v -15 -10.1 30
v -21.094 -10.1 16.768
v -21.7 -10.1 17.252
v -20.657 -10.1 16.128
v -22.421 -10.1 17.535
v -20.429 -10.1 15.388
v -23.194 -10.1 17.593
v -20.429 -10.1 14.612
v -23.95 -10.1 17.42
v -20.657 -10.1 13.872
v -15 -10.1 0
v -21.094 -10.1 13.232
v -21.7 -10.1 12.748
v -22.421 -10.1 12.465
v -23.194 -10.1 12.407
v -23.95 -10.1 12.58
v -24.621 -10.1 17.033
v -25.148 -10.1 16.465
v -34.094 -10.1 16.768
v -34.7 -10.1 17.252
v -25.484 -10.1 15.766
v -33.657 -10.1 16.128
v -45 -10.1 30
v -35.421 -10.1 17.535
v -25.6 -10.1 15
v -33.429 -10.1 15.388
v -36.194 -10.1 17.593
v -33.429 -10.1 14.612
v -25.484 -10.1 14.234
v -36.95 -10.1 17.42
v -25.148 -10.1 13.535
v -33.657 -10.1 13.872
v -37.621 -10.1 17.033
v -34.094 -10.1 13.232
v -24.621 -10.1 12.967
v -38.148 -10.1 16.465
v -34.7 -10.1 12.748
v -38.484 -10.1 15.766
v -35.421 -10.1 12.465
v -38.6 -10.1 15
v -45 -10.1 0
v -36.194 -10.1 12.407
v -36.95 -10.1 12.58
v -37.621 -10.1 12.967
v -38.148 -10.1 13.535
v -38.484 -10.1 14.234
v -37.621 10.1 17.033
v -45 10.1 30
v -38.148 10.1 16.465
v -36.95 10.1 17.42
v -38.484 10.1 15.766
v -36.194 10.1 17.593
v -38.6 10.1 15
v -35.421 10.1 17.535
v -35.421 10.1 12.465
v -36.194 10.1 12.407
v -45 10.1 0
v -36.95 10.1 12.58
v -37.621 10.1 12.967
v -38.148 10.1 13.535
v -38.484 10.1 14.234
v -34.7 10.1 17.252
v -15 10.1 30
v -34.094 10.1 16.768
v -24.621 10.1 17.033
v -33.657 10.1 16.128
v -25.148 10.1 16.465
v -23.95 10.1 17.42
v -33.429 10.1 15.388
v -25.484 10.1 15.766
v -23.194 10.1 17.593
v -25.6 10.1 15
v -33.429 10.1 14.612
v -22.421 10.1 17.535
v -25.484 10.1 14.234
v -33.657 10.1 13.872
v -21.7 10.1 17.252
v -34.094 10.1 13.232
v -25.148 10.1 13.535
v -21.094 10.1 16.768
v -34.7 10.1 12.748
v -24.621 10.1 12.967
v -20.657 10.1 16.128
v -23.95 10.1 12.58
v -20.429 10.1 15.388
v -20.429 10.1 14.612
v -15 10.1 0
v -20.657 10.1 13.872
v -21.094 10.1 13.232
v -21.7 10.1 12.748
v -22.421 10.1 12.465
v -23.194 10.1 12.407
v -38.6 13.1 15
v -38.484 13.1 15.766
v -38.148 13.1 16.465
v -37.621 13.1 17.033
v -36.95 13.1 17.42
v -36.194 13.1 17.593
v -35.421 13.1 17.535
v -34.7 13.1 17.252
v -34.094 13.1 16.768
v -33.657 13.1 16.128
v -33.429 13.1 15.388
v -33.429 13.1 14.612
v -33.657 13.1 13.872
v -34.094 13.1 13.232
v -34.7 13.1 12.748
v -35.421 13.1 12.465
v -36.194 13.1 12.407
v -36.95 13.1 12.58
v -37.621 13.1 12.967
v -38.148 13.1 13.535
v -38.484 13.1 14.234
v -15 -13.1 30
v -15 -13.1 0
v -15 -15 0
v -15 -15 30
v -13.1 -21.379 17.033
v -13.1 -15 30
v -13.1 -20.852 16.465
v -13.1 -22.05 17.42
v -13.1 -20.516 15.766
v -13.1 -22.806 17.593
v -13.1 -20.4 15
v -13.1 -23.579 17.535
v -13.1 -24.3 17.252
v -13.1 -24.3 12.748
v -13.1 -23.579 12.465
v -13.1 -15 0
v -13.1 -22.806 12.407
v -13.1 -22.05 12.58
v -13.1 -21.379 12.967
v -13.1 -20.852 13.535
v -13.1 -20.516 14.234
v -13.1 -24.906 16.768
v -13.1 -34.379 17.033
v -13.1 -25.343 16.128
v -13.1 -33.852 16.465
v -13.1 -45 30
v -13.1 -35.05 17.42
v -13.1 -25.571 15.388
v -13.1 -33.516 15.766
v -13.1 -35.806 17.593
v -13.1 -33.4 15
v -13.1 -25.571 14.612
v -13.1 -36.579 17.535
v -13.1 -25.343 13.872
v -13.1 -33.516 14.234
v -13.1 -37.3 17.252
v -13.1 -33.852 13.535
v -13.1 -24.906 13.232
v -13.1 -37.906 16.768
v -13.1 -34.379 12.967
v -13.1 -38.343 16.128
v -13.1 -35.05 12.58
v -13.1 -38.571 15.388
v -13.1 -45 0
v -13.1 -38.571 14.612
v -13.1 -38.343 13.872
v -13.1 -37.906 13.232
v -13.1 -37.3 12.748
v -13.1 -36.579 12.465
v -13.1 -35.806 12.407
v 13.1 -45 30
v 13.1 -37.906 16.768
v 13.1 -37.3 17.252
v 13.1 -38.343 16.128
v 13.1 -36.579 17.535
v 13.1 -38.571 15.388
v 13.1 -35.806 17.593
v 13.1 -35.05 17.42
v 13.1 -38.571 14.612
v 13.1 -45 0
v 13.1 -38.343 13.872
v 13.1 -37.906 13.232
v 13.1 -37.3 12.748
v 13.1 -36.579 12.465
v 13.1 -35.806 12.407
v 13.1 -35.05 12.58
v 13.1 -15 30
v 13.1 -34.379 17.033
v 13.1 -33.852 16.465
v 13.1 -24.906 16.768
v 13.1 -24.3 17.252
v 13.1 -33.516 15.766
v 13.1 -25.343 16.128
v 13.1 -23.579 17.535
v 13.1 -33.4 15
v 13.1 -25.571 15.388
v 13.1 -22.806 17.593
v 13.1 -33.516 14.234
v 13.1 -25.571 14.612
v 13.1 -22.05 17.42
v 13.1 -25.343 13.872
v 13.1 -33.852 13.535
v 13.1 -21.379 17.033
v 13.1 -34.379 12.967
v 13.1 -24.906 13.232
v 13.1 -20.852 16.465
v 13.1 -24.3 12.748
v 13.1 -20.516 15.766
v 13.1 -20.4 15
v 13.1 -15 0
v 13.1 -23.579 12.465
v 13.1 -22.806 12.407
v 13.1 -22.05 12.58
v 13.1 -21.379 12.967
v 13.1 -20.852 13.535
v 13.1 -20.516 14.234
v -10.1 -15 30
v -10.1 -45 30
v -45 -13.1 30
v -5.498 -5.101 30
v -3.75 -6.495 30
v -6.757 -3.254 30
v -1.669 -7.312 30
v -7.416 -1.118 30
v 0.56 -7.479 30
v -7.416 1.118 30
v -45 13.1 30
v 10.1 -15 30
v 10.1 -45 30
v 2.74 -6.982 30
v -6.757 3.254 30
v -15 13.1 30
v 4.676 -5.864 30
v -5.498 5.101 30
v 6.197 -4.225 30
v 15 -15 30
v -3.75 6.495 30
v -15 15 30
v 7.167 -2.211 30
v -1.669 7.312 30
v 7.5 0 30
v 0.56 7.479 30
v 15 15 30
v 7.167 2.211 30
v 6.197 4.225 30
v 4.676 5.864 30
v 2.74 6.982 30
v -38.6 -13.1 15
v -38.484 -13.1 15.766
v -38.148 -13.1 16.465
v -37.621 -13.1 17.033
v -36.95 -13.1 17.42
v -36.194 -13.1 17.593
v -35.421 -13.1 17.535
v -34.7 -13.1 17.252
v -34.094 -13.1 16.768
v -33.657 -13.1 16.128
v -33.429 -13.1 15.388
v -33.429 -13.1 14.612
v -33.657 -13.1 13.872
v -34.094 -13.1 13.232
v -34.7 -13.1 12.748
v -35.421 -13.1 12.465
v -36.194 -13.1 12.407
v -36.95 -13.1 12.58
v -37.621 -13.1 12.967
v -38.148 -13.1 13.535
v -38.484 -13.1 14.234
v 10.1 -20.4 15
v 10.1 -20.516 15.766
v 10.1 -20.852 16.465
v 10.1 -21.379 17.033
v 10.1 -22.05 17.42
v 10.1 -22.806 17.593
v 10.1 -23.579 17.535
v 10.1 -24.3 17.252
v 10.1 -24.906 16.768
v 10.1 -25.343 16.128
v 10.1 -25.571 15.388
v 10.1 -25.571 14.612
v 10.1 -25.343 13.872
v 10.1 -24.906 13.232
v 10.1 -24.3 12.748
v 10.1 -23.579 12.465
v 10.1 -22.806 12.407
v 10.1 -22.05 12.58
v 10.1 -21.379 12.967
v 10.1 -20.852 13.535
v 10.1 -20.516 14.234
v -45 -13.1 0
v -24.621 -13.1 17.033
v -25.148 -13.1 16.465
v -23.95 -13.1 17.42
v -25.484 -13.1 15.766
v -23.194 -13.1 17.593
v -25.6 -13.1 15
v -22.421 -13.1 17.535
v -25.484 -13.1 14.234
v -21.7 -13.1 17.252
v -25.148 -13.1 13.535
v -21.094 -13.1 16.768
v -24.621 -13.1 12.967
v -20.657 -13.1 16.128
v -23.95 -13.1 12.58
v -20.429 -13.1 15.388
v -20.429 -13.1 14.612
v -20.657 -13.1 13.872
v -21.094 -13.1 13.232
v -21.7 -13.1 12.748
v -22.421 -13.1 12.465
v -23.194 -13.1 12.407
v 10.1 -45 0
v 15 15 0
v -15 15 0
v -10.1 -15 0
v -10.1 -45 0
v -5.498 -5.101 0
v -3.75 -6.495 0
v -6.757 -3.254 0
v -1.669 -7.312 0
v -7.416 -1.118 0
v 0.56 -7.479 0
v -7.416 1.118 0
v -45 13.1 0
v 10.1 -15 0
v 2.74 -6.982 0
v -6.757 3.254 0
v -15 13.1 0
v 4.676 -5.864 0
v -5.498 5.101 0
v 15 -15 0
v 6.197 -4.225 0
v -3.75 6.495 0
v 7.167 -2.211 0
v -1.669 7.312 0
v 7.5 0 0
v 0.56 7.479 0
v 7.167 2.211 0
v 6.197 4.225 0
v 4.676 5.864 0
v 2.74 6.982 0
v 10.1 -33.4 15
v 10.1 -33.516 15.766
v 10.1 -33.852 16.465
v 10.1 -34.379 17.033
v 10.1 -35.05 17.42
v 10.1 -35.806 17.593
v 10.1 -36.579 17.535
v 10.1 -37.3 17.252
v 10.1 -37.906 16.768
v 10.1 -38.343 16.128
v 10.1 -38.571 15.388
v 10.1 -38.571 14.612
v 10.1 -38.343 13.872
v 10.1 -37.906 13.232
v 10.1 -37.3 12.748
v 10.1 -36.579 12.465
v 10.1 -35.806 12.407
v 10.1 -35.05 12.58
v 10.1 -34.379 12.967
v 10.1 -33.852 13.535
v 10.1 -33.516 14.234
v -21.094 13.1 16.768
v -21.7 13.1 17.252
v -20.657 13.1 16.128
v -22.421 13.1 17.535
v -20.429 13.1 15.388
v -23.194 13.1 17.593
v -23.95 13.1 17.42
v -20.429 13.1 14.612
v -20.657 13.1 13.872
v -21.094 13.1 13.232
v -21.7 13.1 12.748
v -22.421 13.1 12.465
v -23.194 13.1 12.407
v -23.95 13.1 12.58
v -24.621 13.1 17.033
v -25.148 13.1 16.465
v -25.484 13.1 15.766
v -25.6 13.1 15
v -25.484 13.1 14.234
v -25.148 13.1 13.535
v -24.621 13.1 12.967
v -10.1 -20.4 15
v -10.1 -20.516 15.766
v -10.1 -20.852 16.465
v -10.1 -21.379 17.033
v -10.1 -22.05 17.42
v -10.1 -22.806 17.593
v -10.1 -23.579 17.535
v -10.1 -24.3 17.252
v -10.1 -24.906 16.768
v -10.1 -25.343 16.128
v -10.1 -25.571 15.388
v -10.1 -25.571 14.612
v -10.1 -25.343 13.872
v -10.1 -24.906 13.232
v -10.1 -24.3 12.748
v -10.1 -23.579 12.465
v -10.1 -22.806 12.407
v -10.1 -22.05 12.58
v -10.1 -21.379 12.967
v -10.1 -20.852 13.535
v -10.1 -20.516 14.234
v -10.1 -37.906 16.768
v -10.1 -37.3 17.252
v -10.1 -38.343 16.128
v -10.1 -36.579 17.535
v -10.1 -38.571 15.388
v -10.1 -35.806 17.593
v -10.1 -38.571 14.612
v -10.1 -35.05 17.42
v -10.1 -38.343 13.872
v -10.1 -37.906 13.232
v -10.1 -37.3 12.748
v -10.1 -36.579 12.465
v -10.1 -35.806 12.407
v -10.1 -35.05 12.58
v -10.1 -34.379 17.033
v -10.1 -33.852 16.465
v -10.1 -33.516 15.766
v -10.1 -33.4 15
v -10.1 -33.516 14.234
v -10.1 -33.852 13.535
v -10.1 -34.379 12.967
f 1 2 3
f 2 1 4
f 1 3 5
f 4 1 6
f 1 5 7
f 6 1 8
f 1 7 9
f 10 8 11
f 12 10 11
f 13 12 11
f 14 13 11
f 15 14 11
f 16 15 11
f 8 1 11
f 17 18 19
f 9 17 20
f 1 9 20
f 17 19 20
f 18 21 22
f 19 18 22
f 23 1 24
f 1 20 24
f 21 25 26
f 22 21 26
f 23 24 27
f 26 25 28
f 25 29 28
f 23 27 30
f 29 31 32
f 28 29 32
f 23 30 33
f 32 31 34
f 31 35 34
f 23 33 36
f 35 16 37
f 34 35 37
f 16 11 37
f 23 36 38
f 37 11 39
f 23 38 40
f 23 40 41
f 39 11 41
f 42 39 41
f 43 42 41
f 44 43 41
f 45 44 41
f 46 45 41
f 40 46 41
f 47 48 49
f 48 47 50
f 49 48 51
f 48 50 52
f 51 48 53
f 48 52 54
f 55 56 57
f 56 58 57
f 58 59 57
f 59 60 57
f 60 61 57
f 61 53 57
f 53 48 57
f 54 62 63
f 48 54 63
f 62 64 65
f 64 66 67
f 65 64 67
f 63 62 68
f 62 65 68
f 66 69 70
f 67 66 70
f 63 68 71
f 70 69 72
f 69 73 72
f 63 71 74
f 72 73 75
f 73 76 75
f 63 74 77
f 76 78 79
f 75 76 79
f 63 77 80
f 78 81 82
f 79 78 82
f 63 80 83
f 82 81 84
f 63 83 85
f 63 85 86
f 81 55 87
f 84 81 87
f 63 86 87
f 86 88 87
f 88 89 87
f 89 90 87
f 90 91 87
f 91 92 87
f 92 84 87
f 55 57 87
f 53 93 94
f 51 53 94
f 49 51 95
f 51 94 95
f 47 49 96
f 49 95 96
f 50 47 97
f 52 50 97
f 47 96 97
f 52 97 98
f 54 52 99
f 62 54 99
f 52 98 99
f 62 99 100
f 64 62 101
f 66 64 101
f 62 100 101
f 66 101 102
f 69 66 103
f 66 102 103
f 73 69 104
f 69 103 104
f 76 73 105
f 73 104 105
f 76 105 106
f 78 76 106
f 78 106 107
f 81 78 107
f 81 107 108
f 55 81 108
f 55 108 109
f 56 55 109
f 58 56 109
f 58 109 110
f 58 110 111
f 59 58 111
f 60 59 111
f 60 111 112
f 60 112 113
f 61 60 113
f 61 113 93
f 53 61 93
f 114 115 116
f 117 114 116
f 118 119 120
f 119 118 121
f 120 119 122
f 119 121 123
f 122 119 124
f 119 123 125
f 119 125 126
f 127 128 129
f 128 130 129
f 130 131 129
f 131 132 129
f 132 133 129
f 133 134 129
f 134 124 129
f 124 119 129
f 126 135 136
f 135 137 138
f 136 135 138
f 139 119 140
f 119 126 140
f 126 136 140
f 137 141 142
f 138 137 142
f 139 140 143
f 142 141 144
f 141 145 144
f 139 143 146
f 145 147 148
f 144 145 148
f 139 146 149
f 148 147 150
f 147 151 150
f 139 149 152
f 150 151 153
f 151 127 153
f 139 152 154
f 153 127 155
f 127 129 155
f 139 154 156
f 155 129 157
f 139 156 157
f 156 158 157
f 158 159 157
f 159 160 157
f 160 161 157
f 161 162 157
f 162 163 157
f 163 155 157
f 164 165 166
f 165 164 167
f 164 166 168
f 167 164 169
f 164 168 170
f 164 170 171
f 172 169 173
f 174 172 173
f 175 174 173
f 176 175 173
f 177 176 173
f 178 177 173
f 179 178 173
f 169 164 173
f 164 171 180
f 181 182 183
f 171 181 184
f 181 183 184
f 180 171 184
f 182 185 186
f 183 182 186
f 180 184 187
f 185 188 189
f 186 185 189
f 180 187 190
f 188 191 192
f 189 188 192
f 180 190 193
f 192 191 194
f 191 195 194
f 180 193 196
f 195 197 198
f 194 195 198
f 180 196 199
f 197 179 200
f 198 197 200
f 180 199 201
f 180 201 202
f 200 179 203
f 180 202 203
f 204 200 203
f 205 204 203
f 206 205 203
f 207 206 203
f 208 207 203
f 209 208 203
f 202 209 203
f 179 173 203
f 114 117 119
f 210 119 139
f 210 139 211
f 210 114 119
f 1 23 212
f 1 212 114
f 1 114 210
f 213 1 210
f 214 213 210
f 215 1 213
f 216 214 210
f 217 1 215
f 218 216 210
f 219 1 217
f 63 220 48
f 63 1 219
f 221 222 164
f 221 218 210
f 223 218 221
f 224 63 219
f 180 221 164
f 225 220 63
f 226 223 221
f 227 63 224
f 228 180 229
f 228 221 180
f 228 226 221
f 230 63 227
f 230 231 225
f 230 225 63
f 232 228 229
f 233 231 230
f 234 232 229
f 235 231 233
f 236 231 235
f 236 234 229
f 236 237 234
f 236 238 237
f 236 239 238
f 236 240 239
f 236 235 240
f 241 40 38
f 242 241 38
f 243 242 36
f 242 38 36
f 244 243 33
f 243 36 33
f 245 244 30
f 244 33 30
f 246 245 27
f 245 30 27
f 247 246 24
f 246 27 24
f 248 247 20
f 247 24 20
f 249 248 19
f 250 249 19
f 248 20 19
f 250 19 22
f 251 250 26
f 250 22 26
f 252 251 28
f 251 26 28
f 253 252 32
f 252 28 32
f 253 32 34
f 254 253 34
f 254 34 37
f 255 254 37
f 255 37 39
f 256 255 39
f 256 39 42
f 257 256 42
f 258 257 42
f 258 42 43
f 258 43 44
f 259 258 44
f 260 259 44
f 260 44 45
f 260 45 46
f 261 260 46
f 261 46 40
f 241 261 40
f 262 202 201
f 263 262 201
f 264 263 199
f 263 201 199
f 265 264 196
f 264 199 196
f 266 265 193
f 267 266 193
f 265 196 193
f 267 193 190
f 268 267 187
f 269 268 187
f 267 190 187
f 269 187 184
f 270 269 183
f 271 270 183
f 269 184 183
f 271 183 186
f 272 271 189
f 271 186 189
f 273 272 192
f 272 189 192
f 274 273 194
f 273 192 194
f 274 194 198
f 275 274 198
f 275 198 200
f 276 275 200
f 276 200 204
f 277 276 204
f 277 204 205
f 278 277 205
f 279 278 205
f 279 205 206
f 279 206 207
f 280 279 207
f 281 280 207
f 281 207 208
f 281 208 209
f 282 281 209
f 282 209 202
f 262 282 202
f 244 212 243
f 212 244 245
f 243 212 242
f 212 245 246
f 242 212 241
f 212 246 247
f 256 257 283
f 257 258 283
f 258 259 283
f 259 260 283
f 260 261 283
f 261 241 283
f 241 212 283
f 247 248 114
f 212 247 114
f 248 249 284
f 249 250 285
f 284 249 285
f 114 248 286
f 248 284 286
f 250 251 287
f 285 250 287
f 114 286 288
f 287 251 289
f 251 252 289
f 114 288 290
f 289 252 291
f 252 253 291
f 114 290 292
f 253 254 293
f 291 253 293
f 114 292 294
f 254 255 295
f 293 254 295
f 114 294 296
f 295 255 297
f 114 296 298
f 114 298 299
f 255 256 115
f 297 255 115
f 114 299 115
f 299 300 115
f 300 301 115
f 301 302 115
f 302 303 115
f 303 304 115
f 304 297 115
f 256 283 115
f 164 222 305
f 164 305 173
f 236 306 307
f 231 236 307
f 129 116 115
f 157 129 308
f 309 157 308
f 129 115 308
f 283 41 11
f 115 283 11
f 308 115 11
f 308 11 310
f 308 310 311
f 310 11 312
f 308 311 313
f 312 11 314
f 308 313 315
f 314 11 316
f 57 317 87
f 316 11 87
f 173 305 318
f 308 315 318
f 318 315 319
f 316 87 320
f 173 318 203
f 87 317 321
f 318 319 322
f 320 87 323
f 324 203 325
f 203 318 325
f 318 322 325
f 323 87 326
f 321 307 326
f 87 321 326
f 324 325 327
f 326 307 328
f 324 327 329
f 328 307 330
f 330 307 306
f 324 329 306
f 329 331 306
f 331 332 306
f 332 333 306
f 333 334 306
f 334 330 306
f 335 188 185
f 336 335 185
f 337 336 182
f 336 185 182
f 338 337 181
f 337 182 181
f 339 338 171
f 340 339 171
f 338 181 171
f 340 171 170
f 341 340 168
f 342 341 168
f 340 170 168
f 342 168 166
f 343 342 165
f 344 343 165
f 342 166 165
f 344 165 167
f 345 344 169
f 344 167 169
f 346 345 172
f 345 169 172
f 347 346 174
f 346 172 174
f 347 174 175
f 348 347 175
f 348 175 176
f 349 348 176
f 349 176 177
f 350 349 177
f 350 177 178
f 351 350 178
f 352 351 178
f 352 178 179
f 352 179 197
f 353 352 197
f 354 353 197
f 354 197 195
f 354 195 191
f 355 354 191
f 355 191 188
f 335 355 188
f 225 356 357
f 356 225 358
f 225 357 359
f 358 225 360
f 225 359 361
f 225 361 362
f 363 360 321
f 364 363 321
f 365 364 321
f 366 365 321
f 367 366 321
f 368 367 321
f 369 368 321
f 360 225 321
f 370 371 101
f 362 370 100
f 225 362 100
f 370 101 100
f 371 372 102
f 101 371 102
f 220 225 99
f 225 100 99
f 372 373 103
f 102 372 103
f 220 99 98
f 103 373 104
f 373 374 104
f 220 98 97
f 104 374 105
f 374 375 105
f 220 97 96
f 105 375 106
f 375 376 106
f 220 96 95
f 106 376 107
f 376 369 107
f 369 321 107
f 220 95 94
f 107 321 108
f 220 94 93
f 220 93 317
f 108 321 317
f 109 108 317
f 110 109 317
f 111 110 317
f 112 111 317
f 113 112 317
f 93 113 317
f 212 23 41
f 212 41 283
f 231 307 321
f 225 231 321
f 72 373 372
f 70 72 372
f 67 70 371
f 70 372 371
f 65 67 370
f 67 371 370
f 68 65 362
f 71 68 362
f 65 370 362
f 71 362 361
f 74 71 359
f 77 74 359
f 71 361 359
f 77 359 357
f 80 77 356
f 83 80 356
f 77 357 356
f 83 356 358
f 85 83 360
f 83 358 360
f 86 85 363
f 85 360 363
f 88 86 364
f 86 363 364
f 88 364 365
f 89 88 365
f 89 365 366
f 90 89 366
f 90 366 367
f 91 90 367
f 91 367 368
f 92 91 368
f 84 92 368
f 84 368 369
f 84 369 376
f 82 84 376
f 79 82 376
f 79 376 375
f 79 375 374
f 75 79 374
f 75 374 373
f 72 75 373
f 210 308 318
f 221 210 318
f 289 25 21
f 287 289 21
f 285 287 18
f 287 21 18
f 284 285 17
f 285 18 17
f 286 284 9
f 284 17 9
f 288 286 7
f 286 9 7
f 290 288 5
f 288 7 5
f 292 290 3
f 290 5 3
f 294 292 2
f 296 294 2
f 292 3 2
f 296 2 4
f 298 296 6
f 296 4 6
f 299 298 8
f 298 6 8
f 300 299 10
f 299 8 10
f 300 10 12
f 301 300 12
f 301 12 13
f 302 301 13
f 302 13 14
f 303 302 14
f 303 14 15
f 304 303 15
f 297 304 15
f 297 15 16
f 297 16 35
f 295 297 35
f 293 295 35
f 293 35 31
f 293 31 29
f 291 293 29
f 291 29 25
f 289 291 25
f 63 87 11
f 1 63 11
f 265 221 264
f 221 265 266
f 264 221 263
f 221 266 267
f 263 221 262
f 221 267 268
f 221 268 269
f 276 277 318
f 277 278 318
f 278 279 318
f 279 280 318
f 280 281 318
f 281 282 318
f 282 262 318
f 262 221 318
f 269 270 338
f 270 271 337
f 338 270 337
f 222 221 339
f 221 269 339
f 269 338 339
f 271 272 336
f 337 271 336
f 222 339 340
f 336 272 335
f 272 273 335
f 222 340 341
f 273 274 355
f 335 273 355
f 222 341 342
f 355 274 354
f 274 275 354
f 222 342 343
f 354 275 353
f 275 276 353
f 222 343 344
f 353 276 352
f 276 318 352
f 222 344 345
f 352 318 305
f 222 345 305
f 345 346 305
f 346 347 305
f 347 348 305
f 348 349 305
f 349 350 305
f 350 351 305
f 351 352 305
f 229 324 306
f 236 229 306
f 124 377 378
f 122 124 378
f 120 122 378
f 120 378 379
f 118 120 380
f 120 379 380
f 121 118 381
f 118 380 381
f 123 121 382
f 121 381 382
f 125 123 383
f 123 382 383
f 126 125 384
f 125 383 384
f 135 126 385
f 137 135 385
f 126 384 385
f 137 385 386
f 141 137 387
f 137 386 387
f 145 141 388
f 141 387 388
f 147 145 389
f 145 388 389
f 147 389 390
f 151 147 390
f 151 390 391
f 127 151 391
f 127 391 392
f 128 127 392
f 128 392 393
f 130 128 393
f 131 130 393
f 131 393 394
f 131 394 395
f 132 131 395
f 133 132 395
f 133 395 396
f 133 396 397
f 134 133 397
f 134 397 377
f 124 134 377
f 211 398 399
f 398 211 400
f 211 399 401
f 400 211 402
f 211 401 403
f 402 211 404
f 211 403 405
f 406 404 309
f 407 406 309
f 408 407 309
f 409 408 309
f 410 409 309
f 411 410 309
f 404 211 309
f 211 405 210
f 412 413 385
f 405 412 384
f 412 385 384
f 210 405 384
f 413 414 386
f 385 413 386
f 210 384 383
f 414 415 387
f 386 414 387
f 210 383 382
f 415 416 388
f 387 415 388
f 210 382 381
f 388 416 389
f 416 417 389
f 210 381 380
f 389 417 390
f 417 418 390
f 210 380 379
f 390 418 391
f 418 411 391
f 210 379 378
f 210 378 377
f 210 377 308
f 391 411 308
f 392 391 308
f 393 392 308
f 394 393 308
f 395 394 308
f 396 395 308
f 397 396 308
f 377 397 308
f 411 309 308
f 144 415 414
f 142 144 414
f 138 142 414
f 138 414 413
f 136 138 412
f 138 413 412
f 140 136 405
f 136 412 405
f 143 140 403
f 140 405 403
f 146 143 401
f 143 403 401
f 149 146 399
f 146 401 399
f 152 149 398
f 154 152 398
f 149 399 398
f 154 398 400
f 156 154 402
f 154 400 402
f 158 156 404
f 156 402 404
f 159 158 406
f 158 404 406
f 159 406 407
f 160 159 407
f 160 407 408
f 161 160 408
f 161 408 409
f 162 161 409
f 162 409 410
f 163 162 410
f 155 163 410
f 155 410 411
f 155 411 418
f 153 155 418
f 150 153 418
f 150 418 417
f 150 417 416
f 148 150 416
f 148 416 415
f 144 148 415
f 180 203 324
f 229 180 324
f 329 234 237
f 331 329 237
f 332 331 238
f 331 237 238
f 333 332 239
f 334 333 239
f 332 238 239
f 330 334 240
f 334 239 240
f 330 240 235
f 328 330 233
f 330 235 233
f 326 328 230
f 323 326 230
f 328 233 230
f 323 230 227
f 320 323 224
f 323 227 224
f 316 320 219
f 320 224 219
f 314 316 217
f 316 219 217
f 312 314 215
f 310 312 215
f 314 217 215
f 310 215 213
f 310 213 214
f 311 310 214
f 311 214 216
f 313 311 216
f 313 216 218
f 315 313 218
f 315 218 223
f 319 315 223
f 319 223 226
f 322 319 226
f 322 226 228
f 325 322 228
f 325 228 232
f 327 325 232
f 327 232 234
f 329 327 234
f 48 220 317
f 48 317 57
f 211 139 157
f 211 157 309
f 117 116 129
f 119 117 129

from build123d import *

# Parameters (mm, degrees)
EXTRUDE_1_DEPTH     = 30
SKETCH_2_R          = 7.5
CUT_EXTRUDE_1_DEPTH = 71.356236397
SKETCH_5_R          = 2.6
CUT_EXTRUDE_4_DEPTH = 80.376381878
SKETCH_6_R          = 2.6
CUT_EXTRUDE_5_DEPTH = 80.376381878


with BuildPart() as part:
    # 草图1 → 凸台-拉伸1 (new body)
    with BuildSketch(Plane.XY):
        Polygon((-15, -15), (-13.1, -15), (-13.1, -45), (-10.1, -45), (-10.1, -15), (10.1, -15), (10.1, -45), (13.1, -45), (13.1, -15), (15, -15), (15, 15), (-15, 15), (-15, 13.1), (-45, 13.1), (-45, 10.1), (-15, 10.1), (-15, -10.1), (-45, -10.1), (-45, -13.1), (-15, -13.1), align=None)
    extrude(amount=EXTRUDE_1_DEPTH)

    # 草图2 → 切除-拉伸1 (cut, through all)
    with BuildSketch(Plane.XY.offset(30)):
        Circle(SKETCH_2_R)
    extrude(amount=-CUT_EXTRUDE_1_DEPTH, mode=Mode.SUBTRACT)

    # 草图5 → 切除-拉伸4 (cut, through all)
    with BuildSketch(Plane(origin=(13.1, 0, 0), x_dir=(0, 0, -1), z_dir=(1, 0, 0))):
        with Locations(Location((-15, -23, 0), (0, 0, 90))):
            Circle(SKETCH_5_R)
        with Locations(Location((-15, -36, 0), (0, 0, 90))):
            Circle(SKETCH_5_R)
    extrude(amount=-CUT_EXTRUDE_4_DEPTH, mode=Mode.SUBTRACT)

    # 草图6 → 切除-拉伸5 (cut, through all)
    with BuildSketch(Plane(origin=(0, 13.1, 0), x_dir=(1, 0, 0), z_dir=(0, 1, 0))):
        with Locations(Location((-23, -15, 0), (0, 0, 180))):
            Circle(SKETCH_6_R)
        with Locations(Location((-36, -15, 0), (0, 0, 180))):
            Circle(SKETCH_6_R)
    extrude(amount=-CUT_EXTRUDE_5_DEPTH, mode=Mode.SUBTRACT)


solid = part.part
